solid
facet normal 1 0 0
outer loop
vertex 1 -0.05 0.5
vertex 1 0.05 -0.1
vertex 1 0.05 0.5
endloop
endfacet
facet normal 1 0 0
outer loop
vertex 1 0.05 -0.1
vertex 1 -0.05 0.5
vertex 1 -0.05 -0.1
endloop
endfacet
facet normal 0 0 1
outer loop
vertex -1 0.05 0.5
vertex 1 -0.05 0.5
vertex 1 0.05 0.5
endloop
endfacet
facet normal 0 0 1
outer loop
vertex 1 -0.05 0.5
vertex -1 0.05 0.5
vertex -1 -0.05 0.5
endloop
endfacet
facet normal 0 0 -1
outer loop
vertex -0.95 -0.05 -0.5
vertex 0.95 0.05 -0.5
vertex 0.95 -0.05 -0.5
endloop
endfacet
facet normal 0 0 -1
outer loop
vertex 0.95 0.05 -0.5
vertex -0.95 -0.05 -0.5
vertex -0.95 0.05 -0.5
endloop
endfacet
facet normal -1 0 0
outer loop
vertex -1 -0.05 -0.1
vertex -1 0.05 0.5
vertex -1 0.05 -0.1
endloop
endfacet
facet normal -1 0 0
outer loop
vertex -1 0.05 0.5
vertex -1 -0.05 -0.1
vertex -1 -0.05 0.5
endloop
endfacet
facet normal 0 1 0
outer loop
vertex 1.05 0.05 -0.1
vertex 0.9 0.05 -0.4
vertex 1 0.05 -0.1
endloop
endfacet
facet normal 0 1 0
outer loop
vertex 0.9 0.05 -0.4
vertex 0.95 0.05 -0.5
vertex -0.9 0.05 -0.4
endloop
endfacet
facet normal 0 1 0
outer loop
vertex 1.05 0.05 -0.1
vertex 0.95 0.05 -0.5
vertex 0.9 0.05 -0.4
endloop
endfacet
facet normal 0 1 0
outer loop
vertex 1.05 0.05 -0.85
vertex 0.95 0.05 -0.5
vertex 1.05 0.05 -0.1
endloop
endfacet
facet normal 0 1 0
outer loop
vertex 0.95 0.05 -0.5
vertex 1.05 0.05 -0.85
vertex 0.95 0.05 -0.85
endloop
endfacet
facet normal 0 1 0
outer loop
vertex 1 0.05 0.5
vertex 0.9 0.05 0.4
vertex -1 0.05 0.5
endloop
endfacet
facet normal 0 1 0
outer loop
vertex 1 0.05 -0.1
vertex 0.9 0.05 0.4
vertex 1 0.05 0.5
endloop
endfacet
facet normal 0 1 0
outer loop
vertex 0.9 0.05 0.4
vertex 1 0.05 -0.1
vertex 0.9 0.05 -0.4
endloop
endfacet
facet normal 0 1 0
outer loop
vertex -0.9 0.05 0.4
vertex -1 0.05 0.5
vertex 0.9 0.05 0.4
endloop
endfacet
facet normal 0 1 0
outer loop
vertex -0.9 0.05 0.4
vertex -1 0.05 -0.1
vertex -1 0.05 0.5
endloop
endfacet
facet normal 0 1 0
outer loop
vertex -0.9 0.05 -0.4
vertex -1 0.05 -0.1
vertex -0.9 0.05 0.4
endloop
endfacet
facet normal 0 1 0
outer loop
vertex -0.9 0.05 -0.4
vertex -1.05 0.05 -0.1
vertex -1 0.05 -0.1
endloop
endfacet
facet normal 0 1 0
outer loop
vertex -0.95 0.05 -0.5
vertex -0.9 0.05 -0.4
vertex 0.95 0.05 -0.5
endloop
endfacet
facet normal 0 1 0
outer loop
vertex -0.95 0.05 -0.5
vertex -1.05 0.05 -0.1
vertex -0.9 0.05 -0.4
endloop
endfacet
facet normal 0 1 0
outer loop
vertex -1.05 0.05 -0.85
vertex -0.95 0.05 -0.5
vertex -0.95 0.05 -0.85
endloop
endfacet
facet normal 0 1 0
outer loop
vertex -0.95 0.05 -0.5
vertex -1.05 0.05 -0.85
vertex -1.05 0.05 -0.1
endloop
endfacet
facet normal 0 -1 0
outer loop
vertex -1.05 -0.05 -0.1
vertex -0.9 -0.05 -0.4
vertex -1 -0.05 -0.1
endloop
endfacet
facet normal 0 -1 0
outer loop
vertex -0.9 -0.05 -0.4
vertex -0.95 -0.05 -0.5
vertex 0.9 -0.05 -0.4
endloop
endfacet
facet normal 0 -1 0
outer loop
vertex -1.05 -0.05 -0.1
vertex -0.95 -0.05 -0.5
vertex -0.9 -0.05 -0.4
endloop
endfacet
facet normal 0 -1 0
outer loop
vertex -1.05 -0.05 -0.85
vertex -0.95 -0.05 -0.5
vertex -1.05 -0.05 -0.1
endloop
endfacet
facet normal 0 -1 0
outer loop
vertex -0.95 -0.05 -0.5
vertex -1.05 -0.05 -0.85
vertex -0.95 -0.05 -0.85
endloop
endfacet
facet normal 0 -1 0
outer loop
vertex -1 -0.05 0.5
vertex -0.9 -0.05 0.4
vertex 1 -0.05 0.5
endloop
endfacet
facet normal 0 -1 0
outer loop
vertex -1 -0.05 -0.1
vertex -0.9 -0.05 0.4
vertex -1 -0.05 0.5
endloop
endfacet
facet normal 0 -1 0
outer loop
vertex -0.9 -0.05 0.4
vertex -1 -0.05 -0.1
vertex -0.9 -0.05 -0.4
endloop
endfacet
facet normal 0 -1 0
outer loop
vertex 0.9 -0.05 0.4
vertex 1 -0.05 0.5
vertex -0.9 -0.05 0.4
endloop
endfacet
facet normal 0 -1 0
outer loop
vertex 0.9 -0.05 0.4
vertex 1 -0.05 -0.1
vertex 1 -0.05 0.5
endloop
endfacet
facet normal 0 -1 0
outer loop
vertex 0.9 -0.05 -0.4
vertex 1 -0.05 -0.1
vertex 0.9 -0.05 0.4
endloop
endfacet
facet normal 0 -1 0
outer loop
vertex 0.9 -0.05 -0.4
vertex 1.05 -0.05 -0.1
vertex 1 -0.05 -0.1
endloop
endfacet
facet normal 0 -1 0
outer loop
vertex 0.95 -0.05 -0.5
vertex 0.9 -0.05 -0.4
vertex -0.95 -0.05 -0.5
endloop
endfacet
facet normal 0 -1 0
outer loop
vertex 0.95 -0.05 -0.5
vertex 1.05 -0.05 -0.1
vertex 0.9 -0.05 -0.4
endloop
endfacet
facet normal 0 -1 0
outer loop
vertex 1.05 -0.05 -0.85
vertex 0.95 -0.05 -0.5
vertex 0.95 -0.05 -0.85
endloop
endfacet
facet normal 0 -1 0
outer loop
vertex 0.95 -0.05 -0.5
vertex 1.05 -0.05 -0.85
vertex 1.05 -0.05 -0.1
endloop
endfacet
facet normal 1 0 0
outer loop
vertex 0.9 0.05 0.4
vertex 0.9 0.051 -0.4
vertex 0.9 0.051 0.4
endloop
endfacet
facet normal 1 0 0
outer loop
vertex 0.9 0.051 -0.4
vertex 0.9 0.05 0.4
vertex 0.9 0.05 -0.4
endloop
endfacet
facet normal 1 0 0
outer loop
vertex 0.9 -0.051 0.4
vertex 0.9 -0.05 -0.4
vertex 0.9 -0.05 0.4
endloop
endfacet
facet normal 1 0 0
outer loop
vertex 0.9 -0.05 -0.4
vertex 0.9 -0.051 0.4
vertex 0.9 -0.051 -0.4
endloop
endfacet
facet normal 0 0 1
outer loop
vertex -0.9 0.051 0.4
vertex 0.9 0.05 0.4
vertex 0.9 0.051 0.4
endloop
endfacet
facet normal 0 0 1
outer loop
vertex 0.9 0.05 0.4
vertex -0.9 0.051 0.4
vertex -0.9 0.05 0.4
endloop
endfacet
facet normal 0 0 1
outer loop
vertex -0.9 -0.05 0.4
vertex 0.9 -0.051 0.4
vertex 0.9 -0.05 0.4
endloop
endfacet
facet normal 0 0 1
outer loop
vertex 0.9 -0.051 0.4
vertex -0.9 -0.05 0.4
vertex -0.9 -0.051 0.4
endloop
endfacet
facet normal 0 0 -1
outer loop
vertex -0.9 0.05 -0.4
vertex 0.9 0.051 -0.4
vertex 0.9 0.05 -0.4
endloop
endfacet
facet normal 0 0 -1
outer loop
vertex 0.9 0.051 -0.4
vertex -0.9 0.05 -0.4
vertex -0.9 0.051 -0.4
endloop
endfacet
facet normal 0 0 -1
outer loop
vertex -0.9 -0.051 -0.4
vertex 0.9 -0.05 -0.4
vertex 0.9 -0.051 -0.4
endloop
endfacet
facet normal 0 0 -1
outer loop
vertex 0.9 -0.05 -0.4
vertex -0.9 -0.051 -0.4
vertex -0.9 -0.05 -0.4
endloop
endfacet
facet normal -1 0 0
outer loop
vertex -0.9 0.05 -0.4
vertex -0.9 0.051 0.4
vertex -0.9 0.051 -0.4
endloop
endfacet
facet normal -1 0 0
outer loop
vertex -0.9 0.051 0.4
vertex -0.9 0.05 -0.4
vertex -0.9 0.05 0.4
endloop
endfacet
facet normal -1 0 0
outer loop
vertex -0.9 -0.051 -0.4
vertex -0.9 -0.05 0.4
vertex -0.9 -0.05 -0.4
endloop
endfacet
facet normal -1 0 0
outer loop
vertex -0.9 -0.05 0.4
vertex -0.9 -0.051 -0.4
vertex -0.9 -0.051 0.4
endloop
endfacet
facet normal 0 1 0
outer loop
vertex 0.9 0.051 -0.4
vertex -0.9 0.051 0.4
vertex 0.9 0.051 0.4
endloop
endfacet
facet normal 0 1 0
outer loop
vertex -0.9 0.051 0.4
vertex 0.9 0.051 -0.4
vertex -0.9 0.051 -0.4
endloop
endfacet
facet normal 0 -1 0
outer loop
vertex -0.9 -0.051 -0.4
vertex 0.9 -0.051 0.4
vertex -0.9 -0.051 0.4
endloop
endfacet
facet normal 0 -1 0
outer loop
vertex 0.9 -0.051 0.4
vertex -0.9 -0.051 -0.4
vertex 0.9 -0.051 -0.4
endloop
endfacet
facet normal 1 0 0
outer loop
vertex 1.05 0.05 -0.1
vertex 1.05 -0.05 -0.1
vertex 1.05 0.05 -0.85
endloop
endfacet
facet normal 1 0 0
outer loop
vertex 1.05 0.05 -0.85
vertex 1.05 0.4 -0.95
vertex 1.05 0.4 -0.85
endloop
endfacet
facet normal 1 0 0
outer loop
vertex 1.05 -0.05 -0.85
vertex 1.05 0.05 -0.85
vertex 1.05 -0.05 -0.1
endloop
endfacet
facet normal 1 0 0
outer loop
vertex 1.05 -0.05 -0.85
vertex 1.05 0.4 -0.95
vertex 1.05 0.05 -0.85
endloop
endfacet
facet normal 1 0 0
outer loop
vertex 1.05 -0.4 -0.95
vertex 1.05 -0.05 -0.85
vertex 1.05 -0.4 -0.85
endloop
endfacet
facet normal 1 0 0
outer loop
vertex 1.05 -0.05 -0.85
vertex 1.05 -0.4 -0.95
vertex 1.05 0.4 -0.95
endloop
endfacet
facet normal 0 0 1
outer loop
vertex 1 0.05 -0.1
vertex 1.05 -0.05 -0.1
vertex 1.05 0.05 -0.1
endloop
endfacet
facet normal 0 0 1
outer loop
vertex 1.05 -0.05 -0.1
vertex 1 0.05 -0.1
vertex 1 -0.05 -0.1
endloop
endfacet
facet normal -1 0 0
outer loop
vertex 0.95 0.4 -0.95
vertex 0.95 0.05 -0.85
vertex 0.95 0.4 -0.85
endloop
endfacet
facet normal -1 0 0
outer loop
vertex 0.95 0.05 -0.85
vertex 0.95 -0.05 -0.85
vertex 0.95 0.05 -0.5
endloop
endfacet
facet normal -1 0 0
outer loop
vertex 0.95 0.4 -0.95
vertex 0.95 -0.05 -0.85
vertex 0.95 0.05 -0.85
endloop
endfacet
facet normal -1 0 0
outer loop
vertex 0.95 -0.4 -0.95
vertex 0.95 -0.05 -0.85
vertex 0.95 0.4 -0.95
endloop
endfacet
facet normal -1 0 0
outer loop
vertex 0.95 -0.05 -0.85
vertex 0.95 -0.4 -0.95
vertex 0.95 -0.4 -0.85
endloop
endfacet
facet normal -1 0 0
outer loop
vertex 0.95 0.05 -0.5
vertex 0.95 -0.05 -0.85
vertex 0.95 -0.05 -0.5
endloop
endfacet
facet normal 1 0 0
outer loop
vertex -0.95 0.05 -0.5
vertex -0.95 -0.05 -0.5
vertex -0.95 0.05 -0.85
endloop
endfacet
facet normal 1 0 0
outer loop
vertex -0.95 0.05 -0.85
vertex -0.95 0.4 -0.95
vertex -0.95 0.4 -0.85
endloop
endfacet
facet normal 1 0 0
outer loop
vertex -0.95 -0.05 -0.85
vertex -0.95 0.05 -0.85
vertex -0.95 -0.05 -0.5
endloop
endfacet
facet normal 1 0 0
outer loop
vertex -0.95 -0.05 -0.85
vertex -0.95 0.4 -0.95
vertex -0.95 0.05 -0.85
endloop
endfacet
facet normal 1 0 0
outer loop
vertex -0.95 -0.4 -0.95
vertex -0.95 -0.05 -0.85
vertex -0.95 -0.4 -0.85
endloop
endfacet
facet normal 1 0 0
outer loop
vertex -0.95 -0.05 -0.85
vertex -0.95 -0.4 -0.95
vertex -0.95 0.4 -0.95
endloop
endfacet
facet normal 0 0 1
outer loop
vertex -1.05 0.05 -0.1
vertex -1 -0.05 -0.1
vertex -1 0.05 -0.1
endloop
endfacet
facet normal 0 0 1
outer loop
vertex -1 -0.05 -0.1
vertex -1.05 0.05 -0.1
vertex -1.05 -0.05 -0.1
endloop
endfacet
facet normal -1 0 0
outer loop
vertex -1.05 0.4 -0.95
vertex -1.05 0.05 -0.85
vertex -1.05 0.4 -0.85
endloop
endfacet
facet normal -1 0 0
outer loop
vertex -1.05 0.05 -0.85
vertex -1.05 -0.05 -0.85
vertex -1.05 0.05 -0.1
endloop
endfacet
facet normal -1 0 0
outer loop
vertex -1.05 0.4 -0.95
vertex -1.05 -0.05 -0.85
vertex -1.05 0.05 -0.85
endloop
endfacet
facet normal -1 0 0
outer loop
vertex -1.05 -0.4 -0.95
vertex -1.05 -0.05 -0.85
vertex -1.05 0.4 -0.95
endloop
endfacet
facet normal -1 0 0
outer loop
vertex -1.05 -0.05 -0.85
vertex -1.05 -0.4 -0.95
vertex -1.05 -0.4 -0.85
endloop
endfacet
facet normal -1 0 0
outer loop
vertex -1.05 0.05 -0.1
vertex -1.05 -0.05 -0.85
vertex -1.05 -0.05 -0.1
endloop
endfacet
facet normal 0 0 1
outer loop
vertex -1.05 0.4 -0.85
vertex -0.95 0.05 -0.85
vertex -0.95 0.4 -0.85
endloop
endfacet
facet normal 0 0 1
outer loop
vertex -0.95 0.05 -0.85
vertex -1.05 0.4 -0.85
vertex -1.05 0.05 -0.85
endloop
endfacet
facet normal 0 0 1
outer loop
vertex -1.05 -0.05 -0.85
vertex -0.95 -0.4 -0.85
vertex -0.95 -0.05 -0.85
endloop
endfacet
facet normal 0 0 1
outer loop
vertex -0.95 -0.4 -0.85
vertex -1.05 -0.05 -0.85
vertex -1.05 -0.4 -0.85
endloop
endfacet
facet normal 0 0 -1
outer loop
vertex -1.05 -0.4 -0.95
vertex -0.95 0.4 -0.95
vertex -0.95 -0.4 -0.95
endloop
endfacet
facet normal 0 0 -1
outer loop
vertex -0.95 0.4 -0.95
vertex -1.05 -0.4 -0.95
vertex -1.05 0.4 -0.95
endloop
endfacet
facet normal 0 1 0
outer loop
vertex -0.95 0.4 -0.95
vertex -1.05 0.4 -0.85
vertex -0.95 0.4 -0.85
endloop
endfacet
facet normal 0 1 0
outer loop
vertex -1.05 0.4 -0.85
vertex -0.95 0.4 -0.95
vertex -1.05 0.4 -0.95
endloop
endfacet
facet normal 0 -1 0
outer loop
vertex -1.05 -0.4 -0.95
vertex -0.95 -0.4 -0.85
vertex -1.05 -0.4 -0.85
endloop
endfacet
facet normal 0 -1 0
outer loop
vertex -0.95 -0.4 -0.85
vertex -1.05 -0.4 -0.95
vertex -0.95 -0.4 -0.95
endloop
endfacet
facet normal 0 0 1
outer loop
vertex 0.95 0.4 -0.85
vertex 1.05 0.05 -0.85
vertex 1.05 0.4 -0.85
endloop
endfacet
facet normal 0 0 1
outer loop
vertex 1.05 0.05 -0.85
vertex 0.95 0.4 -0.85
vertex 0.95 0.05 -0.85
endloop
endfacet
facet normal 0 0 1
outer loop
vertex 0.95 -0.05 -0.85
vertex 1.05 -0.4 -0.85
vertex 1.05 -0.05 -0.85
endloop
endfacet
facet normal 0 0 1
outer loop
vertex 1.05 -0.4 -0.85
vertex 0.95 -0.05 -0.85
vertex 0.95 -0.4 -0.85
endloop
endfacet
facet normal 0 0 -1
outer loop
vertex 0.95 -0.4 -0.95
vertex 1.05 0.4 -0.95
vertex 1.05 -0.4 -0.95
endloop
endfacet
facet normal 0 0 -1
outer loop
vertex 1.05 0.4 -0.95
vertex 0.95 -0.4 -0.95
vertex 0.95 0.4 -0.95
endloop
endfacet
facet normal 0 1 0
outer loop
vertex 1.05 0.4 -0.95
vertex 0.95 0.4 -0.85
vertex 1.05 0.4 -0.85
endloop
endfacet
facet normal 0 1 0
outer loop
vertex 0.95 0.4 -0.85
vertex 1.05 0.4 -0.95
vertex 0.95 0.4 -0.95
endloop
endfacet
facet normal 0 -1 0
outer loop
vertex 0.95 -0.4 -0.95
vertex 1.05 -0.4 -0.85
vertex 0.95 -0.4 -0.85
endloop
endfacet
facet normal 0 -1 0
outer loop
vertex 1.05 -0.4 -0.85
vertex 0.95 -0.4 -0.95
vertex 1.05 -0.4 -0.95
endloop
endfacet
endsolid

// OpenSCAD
module Chalkboard_02(){

    union(){
        color("#c87d3a")
        cube([2,0.1,1],center =true);
        
        color("#424e63")
        cube([1.8,0.102,0.8],center =true);
        
        color("#c87d3a"){
            translate([1,0,-0.5])
            cube([0.1,0.1,0.8],center =true);            
        }
        color("#c87d3a"){
            translate([-1,0,-0.5])
            cube([0.1,0.1,0.8],center =true);
        }        
        color("#c87d3a"){
            translate([-1,0,-0.9])
            cube([0.1,0.8,0.1],center =true);
        }
        color("#c87d3a"){
            translate([1,0,-0.9])
            cube([0.1,0.8,0.1],center =true);
        }
    }
}

Chalkboard_02();


// Written by Nicolì Angelo (Gengio) 2024: 
// MIT License

//Permission is hereby granted, free of charge, to any person obtaining a copy of this software and associated documentation files (the "Software"), to deal in the Software without restriction, including without limitation the rights to use, copy, modify, merge, publish, distribute, sublicense, and/or sell copies of the Software, and to permit persons to whom the Software is furnished to do so, subject to the following conditions:

//The above copyright notice and this permission notice shall be included in all copies or substantial portions of the Software.

//THE SOFTWARE IS PROVIDED "AS IS", WITHOUT WARRANTY OF ANY KIND, EXPRESS OR IMPLIED, INCLUDING BUT NOT LIMITED TO THE WARRANTIES OF MERCHANTABILITY, FITNESS FOR A PARTICULAR PURPOSE AND NONINFRINGEMENT. IN NO EVENT SHALL THE AUTHORS OR COPYRIGHT HOLDERS BE LIABLE FOR ANY CLAIM, DAMAGES OR OTHER LIABILITY, WHETHER IN AN ACTION OF CONTRACT, TORT OR OTHERWISE, ARISING FROM, OUT OF OR IN CONNECTION WITH THE SOFTWARE OR THE USE OR OTHER DEALINGS IN THE SOFTWARE.
